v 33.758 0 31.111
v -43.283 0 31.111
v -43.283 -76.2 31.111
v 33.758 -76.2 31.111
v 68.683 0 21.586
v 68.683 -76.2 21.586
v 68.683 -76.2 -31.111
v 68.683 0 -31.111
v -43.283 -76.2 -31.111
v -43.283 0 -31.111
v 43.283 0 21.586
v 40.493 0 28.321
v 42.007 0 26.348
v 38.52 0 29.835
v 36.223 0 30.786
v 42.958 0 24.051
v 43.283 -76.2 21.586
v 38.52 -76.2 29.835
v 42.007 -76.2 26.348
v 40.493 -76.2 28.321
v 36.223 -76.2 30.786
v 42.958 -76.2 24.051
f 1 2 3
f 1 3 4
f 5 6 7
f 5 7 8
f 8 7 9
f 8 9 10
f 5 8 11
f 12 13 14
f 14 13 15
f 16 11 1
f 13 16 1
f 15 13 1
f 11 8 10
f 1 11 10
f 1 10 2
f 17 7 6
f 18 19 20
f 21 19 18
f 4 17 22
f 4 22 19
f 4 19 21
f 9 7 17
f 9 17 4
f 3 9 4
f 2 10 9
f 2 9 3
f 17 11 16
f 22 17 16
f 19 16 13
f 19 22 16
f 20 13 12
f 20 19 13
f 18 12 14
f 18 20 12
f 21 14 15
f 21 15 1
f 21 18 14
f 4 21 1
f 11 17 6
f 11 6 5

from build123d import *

# Parameters (mm, degrees)
F0_W      = 86.565242
F0_H      = 62.221606
F1_DEPTH  = 76.2
F2_R      = 9.525
F1_FACE_W = 76.2
F1_FACE_H = 52.696606
F3_DEPTH  = 25.4


with BuildPart() as f1:
    # F0 (on Front) → F1 (new body)
    with BuildSketch(Plane.XZ):
        Rectangle(F0_W, F0_H)
    extrude(amount=F1_DEPTH)

    # F2
    f2_edges = [f1.edges().sort_by_distance(p)[0] for p in [
        (43.282621, -38.1, 31.110803),
    ]]
    fillet(f2_edges, radius=F2_R)

    # F1_face (on face) → F3 (join)
    with BuildSketch(Plane(origin=(43.282621, -38.1, -4.7625), x_dir=(0, 1, 0), z_dir=(1, 0, 0))):
        Rectangle(F1_FACE_W, F1_FACE_H)
    extrude(amount=F3_DEPTH)


solid = f1.part
